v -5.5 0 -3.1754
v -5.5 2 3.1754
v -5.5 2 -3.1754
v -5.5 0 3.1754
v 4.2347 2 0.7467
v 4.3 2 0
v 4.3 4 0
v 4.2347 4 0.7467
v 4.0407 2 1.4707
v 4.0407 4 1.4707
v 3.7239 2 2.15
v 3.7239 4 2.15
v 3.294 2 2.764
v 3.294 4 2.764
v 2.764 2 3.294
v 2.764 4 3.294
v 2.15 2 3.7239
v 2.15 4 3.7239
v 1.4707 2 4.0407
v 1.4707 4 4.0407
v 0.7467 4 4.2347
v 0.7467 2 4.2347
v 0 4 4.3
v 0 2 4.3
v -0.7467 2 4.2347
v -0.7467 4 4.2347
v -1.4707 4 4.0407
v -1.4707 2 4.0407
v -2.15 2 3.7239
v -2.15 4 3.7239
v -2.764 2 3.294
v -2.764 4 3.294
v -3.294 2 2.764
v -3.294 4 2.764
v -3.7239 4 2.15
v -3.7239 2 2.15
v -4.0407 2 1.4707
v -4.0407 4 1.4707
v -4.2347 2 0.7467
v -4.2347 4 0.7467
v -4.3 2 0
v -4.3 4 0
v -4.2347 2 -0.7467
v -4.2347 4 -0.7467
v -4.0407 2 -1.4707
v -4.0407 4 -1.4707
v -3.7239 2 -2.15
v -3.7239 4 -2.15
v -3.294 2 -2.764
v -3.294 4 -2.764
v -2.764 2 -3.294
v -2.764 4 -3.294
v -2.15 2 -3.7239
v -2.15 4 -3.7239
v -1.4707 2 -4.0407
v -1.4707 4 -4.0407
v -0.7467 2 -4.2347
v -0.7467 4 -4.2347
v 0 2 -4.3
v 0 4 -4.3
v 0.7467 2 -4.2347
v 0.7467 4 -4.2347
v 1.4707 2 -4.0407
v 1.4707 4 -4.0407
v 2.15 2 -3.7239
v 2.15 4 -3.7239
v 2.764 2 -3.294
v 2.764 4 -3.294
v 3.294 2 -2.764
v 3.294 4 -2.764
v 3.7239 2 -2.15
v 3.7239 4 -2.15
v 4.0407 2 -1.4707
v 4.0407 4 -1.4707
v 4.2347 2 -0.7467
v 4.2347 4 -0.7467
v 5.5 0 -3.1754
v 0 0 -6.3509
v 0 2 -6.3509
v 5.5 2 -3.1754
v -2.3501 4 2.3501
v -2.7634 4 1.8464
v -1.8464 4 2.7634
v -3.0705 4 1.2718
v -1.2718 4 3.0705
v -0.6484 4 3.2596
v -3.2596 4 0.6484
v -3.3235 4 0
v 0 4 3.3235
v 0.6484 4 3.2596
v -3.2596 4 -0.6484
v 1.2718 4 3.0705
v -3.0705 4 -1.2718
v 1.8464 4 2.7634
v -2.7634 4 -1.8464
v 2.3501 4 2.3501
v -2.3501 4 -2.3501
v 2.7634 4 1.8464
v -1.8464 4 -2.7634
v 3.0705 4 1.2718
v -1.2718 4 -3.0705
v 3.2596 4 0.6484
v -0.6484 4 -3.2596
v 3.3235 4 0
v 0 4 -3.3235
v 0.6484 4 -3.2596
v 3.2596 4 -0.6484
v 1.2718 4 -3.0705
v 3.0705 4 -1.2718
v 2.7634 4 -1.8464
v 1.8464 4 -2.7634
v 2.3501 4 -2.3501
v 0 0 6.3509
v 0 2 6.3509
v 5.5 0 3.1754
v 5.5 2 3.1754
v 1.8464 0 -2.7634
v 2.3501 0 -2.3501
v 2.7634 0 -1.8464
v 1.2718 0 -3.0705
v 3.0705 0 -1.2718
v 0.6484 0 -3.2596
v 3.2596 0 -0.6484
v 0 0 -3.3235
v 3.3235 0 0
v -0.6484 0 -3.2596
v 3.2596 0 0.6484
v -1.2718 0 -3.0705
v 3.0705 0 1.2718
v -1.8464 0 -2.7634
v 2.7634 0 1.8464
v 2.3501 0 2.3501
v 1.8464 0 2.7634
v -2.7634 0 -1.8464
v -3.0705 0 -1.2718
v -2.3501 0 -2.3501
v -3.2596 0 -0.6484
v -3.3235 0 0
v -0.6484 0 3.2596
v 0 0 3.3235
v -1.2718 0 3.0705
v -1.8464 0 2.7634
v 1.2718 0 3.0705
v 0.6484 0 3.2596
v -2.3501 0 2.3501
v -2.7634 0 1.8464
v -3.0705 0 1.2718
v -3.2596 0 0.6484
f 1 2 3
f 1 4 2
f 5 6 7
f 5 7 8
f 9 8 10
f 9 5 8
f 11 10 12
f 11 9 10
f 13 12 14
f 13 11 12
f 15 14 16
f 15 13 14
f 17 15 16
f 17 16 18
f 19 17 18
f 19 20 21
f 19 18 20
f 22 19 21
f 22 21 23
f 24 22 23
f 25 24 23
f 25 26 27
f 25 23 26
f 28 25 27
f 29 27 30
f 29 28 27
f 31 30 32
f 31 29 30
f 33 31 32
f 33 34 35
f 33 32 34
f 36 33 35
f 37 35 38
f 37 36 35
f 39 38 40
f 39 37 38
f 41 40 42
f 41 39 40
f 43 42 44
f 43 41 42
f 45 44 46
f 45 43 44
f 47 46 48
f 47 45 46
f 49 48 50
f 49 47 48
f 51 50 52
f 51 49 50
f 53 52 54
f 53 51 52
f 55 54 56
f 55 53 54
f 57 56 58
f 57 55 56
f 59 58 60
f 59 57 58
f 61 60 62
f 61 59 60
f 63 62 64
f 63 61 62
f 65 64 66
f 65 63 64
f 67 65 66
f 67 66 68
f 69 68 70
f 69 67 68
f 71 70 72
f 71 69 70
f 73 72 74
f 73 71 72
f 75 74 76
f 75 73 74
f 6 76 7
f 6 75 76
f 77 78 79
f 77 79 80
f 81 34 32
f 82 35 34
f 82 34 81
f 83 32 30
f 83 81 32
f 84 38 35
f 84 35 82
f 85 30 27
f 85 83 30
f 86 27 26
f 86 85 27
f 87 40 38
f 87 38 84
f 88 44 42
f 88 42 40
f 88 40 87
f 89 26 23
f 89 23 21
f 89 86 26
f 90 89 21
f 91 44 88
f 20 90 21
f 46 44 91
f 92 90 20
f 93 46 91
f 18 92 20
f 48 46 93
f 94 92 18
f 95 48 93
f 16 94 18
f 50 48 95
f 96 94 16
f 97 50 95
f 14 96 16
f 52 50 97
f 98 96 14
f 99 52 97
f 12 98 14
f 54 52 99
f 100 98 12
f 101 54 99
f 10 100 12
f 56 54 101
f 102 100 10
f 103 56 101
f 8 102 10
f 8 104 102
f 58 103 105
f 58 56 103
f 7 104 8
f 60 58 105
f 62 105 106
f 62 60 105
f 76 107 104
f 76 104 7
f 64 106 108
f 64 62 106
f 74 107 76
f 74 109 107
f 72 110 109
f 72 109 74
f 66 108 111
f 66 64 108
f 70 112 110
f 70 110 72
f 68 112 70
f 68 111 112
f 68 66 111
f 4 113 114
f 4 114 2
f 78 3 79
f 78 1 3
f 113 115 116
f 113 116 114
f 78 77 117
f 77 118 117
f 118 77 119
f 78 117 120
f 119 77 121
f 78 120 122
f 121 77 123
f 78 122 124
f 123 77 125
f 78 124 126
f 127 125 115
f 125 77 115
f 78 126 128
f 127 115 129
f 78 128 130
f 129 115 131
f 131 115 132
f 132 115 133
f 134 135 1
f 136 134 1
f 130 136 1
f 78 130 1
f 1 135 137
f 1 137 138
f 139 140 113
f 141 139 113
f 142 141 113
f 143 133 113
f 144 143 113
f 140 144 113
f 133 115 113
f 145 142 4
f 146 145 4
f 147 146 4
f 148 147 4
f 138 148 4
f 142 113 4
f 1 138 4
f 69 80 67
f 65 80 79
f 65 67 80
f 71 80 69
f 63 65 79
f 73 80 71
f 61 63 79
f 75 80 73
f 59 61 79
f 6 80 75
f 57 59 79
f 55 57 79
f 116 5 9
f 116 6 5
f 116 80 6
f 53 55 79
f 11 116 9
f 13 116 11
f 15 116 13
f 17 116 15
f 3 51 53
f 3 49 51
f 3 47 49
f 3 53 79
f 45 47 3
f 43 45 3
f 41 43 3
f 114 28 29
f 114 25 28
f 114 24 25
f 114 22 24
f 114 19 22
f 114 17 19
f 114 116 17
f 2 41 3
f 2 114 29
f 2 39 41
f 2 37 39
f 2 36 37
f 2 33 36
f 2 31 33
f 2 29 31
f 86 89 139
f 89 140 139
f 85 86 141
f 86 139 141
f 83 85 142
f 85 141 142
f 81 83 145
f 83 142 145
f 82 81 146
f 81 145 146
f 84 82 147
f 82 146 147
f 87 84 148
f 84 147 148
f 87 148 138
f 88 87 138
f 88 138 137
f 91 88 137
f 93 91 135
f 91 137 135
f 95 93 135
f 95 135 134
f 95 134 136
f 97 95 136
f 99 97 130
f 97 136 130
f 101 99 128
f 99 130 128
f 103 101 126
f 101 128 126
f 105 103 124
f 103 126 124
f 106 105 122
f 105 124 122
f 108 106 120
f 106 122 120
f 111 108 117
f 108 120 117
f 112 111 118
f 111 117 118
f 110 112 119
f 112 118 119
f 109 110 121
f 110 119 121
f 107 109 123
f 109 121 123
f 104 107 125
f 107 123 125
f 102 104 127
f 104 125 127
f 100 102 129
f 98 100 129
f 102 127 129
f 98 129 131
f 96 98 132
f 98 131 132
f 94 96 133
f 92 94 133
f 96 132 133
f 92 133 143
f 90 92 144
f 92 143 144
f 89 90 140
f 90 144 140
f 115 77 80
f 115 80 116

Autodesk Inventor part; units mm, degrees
ref_plane "YZ Plane" through (0, 0, 0) normal (1, 0, 0) x (0, 1, 0)
ref_plane "XZ Plane" through (0, 0, 0) normal (0, 1, 0) x (-1, 0, 0)
ref_plane "XY Plane" through (0, 0, 0) normal (0, 0, 1) x (1, 0, 0)
sketch "Sketch1" plane through (0, 0, 0) normal (0, 1, 0) x (-1, 0, 0)
  line L0 (-5.5, 3.1754) -> (0, 6.3509)
  line L1 (0, 6.3509) -> (5.5, 3.1754)
  line L2 (5.5, 3.1754) -> (5.5, -3.1754)
  line L3 (5.5, -3.1754) -> (0, -6.3509)
  line L4 (0, -6.3509) -> (-5.5, -3.1754)
  line L5 (-5.5, -3.1754) -> (-5.5, 3.1754)
  point P0 (0, 0)
  point P1 (0, 0)
  dimension "d0" = 11
extrude "Extrusion1" add sketch "Sketch1" along normal blind 2
sketch "Sketch2" plane through (0, 2, 0) normal (0, 1, 0) x (1, 0, 0)
  circle A0 centre (0, 0) radius 4.3
  dimension "d3" = 8.6
extrude "Extrusion2" add sketch "Sketch2" along normal blind 2
sketch "Sketch3" plane through (0, 4, 0) normal (0, 1, 0) x (1, 0, 0)
  circle A0 centre (0, 0) radius 4
  circle A1 centre (0, 0) radius 4.3 projected
  dimension "d6" = 8
hole "Hole1" at (0, 4, 0) direction (0, -1, 0) diameter 6.647 end through all thread size "M8x1.25" class "6H" standard "ISO Metric profile"
properties part number "Pot Adaptor"
